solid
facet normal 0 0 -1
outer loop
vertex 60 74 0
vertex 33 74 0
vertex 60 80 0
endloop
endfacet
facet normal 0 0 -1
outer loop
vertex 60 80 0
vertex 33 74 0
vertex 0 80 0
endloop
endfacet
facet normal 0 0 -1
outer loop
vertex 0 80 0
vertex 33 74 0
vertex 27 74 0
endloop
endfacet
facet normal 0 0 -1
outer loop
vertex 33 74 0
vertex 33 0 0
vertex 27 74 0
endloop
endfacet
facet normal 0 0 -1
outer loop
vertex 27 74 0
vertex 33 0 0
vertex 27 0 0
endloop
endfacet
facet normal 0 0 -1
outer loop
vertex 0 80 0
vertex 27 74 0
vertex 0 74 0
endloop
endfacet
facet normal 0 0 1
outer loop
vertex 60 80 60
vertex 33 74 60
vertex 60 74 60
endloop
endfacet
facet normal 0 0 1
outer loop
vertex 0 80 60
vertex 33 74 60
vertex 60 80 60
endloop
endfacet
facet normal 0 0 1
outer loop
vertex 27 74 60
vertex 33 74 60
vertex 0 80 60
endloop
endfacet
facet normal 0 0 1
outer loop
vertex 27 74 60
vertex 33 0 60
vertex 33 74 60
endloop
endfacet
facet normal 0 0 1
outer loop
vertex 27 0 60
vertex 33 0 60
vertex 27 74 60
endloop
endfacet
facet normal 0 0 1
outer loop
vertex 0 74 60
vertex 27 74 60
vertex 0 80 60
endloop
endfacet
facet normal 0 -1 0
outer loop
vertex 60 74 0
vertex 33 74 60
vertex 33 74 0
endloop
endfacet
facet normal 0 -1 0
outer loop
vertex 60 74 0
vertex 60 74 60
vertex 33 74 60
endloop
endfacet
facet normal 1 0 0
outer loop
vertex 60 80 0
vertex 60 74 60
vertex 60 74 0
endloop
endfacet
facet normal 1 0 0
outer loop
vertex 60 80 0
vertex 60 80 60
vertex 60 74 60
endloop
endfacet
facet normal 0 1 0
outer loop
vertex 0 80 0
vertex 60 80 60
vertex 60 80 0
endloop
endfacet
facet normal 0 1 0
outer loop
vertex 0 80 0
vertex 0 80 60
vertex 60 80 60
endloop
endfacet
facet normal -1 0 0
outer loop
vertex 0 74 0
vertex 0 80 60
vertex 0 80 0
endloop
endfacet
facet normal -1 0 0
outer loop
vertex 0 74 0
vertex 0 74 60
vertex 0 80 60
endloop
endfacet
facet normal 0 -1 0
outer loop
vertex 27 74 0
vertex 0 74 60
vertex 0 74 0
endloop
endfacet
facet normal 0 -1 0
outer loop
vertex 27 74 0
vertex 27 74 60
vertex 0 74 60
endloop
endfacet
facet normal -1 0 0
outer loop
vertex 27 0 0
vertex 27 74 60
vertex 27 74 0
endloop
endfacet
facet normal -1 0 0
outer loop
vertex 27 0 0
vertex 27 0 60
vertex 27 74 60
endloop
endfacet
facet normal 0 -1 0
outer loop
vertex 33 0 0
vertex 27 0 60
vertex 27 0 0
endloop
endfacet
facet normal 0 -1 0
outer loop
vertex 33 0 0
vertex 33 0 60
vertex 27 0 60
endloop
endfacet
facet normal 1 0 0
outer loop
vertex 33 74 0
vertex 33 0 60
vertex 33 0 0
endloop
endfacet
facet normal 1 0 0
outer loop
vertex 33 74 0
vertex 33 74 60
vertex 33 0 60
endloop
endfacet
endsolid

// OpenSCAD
$fn = 32;

// ----------------------------------------------------------------------
// Structural section: tee 60 x 80 mm
// ----------------------------------------------------------------------

// --- parameters (mm) ---
sec_w = 60;               // tee width, X
sec_h = 80;               // tee height, Y
flange_t = 6;             // top flange thickness
web_t = 6;                // web thickness
plate_t = 60;             // cut length, Z (extrusion height)

profile = [[27, 0], [33, 0], [33, 74], [60, 74], [60, 80], [0, 80], [0, 74], [27, 74]];  // primary outline, 8 points, counter clockwise

// --- the one profile operation ---
linear_extrude(height = plate_t) polygon(points = profile);
